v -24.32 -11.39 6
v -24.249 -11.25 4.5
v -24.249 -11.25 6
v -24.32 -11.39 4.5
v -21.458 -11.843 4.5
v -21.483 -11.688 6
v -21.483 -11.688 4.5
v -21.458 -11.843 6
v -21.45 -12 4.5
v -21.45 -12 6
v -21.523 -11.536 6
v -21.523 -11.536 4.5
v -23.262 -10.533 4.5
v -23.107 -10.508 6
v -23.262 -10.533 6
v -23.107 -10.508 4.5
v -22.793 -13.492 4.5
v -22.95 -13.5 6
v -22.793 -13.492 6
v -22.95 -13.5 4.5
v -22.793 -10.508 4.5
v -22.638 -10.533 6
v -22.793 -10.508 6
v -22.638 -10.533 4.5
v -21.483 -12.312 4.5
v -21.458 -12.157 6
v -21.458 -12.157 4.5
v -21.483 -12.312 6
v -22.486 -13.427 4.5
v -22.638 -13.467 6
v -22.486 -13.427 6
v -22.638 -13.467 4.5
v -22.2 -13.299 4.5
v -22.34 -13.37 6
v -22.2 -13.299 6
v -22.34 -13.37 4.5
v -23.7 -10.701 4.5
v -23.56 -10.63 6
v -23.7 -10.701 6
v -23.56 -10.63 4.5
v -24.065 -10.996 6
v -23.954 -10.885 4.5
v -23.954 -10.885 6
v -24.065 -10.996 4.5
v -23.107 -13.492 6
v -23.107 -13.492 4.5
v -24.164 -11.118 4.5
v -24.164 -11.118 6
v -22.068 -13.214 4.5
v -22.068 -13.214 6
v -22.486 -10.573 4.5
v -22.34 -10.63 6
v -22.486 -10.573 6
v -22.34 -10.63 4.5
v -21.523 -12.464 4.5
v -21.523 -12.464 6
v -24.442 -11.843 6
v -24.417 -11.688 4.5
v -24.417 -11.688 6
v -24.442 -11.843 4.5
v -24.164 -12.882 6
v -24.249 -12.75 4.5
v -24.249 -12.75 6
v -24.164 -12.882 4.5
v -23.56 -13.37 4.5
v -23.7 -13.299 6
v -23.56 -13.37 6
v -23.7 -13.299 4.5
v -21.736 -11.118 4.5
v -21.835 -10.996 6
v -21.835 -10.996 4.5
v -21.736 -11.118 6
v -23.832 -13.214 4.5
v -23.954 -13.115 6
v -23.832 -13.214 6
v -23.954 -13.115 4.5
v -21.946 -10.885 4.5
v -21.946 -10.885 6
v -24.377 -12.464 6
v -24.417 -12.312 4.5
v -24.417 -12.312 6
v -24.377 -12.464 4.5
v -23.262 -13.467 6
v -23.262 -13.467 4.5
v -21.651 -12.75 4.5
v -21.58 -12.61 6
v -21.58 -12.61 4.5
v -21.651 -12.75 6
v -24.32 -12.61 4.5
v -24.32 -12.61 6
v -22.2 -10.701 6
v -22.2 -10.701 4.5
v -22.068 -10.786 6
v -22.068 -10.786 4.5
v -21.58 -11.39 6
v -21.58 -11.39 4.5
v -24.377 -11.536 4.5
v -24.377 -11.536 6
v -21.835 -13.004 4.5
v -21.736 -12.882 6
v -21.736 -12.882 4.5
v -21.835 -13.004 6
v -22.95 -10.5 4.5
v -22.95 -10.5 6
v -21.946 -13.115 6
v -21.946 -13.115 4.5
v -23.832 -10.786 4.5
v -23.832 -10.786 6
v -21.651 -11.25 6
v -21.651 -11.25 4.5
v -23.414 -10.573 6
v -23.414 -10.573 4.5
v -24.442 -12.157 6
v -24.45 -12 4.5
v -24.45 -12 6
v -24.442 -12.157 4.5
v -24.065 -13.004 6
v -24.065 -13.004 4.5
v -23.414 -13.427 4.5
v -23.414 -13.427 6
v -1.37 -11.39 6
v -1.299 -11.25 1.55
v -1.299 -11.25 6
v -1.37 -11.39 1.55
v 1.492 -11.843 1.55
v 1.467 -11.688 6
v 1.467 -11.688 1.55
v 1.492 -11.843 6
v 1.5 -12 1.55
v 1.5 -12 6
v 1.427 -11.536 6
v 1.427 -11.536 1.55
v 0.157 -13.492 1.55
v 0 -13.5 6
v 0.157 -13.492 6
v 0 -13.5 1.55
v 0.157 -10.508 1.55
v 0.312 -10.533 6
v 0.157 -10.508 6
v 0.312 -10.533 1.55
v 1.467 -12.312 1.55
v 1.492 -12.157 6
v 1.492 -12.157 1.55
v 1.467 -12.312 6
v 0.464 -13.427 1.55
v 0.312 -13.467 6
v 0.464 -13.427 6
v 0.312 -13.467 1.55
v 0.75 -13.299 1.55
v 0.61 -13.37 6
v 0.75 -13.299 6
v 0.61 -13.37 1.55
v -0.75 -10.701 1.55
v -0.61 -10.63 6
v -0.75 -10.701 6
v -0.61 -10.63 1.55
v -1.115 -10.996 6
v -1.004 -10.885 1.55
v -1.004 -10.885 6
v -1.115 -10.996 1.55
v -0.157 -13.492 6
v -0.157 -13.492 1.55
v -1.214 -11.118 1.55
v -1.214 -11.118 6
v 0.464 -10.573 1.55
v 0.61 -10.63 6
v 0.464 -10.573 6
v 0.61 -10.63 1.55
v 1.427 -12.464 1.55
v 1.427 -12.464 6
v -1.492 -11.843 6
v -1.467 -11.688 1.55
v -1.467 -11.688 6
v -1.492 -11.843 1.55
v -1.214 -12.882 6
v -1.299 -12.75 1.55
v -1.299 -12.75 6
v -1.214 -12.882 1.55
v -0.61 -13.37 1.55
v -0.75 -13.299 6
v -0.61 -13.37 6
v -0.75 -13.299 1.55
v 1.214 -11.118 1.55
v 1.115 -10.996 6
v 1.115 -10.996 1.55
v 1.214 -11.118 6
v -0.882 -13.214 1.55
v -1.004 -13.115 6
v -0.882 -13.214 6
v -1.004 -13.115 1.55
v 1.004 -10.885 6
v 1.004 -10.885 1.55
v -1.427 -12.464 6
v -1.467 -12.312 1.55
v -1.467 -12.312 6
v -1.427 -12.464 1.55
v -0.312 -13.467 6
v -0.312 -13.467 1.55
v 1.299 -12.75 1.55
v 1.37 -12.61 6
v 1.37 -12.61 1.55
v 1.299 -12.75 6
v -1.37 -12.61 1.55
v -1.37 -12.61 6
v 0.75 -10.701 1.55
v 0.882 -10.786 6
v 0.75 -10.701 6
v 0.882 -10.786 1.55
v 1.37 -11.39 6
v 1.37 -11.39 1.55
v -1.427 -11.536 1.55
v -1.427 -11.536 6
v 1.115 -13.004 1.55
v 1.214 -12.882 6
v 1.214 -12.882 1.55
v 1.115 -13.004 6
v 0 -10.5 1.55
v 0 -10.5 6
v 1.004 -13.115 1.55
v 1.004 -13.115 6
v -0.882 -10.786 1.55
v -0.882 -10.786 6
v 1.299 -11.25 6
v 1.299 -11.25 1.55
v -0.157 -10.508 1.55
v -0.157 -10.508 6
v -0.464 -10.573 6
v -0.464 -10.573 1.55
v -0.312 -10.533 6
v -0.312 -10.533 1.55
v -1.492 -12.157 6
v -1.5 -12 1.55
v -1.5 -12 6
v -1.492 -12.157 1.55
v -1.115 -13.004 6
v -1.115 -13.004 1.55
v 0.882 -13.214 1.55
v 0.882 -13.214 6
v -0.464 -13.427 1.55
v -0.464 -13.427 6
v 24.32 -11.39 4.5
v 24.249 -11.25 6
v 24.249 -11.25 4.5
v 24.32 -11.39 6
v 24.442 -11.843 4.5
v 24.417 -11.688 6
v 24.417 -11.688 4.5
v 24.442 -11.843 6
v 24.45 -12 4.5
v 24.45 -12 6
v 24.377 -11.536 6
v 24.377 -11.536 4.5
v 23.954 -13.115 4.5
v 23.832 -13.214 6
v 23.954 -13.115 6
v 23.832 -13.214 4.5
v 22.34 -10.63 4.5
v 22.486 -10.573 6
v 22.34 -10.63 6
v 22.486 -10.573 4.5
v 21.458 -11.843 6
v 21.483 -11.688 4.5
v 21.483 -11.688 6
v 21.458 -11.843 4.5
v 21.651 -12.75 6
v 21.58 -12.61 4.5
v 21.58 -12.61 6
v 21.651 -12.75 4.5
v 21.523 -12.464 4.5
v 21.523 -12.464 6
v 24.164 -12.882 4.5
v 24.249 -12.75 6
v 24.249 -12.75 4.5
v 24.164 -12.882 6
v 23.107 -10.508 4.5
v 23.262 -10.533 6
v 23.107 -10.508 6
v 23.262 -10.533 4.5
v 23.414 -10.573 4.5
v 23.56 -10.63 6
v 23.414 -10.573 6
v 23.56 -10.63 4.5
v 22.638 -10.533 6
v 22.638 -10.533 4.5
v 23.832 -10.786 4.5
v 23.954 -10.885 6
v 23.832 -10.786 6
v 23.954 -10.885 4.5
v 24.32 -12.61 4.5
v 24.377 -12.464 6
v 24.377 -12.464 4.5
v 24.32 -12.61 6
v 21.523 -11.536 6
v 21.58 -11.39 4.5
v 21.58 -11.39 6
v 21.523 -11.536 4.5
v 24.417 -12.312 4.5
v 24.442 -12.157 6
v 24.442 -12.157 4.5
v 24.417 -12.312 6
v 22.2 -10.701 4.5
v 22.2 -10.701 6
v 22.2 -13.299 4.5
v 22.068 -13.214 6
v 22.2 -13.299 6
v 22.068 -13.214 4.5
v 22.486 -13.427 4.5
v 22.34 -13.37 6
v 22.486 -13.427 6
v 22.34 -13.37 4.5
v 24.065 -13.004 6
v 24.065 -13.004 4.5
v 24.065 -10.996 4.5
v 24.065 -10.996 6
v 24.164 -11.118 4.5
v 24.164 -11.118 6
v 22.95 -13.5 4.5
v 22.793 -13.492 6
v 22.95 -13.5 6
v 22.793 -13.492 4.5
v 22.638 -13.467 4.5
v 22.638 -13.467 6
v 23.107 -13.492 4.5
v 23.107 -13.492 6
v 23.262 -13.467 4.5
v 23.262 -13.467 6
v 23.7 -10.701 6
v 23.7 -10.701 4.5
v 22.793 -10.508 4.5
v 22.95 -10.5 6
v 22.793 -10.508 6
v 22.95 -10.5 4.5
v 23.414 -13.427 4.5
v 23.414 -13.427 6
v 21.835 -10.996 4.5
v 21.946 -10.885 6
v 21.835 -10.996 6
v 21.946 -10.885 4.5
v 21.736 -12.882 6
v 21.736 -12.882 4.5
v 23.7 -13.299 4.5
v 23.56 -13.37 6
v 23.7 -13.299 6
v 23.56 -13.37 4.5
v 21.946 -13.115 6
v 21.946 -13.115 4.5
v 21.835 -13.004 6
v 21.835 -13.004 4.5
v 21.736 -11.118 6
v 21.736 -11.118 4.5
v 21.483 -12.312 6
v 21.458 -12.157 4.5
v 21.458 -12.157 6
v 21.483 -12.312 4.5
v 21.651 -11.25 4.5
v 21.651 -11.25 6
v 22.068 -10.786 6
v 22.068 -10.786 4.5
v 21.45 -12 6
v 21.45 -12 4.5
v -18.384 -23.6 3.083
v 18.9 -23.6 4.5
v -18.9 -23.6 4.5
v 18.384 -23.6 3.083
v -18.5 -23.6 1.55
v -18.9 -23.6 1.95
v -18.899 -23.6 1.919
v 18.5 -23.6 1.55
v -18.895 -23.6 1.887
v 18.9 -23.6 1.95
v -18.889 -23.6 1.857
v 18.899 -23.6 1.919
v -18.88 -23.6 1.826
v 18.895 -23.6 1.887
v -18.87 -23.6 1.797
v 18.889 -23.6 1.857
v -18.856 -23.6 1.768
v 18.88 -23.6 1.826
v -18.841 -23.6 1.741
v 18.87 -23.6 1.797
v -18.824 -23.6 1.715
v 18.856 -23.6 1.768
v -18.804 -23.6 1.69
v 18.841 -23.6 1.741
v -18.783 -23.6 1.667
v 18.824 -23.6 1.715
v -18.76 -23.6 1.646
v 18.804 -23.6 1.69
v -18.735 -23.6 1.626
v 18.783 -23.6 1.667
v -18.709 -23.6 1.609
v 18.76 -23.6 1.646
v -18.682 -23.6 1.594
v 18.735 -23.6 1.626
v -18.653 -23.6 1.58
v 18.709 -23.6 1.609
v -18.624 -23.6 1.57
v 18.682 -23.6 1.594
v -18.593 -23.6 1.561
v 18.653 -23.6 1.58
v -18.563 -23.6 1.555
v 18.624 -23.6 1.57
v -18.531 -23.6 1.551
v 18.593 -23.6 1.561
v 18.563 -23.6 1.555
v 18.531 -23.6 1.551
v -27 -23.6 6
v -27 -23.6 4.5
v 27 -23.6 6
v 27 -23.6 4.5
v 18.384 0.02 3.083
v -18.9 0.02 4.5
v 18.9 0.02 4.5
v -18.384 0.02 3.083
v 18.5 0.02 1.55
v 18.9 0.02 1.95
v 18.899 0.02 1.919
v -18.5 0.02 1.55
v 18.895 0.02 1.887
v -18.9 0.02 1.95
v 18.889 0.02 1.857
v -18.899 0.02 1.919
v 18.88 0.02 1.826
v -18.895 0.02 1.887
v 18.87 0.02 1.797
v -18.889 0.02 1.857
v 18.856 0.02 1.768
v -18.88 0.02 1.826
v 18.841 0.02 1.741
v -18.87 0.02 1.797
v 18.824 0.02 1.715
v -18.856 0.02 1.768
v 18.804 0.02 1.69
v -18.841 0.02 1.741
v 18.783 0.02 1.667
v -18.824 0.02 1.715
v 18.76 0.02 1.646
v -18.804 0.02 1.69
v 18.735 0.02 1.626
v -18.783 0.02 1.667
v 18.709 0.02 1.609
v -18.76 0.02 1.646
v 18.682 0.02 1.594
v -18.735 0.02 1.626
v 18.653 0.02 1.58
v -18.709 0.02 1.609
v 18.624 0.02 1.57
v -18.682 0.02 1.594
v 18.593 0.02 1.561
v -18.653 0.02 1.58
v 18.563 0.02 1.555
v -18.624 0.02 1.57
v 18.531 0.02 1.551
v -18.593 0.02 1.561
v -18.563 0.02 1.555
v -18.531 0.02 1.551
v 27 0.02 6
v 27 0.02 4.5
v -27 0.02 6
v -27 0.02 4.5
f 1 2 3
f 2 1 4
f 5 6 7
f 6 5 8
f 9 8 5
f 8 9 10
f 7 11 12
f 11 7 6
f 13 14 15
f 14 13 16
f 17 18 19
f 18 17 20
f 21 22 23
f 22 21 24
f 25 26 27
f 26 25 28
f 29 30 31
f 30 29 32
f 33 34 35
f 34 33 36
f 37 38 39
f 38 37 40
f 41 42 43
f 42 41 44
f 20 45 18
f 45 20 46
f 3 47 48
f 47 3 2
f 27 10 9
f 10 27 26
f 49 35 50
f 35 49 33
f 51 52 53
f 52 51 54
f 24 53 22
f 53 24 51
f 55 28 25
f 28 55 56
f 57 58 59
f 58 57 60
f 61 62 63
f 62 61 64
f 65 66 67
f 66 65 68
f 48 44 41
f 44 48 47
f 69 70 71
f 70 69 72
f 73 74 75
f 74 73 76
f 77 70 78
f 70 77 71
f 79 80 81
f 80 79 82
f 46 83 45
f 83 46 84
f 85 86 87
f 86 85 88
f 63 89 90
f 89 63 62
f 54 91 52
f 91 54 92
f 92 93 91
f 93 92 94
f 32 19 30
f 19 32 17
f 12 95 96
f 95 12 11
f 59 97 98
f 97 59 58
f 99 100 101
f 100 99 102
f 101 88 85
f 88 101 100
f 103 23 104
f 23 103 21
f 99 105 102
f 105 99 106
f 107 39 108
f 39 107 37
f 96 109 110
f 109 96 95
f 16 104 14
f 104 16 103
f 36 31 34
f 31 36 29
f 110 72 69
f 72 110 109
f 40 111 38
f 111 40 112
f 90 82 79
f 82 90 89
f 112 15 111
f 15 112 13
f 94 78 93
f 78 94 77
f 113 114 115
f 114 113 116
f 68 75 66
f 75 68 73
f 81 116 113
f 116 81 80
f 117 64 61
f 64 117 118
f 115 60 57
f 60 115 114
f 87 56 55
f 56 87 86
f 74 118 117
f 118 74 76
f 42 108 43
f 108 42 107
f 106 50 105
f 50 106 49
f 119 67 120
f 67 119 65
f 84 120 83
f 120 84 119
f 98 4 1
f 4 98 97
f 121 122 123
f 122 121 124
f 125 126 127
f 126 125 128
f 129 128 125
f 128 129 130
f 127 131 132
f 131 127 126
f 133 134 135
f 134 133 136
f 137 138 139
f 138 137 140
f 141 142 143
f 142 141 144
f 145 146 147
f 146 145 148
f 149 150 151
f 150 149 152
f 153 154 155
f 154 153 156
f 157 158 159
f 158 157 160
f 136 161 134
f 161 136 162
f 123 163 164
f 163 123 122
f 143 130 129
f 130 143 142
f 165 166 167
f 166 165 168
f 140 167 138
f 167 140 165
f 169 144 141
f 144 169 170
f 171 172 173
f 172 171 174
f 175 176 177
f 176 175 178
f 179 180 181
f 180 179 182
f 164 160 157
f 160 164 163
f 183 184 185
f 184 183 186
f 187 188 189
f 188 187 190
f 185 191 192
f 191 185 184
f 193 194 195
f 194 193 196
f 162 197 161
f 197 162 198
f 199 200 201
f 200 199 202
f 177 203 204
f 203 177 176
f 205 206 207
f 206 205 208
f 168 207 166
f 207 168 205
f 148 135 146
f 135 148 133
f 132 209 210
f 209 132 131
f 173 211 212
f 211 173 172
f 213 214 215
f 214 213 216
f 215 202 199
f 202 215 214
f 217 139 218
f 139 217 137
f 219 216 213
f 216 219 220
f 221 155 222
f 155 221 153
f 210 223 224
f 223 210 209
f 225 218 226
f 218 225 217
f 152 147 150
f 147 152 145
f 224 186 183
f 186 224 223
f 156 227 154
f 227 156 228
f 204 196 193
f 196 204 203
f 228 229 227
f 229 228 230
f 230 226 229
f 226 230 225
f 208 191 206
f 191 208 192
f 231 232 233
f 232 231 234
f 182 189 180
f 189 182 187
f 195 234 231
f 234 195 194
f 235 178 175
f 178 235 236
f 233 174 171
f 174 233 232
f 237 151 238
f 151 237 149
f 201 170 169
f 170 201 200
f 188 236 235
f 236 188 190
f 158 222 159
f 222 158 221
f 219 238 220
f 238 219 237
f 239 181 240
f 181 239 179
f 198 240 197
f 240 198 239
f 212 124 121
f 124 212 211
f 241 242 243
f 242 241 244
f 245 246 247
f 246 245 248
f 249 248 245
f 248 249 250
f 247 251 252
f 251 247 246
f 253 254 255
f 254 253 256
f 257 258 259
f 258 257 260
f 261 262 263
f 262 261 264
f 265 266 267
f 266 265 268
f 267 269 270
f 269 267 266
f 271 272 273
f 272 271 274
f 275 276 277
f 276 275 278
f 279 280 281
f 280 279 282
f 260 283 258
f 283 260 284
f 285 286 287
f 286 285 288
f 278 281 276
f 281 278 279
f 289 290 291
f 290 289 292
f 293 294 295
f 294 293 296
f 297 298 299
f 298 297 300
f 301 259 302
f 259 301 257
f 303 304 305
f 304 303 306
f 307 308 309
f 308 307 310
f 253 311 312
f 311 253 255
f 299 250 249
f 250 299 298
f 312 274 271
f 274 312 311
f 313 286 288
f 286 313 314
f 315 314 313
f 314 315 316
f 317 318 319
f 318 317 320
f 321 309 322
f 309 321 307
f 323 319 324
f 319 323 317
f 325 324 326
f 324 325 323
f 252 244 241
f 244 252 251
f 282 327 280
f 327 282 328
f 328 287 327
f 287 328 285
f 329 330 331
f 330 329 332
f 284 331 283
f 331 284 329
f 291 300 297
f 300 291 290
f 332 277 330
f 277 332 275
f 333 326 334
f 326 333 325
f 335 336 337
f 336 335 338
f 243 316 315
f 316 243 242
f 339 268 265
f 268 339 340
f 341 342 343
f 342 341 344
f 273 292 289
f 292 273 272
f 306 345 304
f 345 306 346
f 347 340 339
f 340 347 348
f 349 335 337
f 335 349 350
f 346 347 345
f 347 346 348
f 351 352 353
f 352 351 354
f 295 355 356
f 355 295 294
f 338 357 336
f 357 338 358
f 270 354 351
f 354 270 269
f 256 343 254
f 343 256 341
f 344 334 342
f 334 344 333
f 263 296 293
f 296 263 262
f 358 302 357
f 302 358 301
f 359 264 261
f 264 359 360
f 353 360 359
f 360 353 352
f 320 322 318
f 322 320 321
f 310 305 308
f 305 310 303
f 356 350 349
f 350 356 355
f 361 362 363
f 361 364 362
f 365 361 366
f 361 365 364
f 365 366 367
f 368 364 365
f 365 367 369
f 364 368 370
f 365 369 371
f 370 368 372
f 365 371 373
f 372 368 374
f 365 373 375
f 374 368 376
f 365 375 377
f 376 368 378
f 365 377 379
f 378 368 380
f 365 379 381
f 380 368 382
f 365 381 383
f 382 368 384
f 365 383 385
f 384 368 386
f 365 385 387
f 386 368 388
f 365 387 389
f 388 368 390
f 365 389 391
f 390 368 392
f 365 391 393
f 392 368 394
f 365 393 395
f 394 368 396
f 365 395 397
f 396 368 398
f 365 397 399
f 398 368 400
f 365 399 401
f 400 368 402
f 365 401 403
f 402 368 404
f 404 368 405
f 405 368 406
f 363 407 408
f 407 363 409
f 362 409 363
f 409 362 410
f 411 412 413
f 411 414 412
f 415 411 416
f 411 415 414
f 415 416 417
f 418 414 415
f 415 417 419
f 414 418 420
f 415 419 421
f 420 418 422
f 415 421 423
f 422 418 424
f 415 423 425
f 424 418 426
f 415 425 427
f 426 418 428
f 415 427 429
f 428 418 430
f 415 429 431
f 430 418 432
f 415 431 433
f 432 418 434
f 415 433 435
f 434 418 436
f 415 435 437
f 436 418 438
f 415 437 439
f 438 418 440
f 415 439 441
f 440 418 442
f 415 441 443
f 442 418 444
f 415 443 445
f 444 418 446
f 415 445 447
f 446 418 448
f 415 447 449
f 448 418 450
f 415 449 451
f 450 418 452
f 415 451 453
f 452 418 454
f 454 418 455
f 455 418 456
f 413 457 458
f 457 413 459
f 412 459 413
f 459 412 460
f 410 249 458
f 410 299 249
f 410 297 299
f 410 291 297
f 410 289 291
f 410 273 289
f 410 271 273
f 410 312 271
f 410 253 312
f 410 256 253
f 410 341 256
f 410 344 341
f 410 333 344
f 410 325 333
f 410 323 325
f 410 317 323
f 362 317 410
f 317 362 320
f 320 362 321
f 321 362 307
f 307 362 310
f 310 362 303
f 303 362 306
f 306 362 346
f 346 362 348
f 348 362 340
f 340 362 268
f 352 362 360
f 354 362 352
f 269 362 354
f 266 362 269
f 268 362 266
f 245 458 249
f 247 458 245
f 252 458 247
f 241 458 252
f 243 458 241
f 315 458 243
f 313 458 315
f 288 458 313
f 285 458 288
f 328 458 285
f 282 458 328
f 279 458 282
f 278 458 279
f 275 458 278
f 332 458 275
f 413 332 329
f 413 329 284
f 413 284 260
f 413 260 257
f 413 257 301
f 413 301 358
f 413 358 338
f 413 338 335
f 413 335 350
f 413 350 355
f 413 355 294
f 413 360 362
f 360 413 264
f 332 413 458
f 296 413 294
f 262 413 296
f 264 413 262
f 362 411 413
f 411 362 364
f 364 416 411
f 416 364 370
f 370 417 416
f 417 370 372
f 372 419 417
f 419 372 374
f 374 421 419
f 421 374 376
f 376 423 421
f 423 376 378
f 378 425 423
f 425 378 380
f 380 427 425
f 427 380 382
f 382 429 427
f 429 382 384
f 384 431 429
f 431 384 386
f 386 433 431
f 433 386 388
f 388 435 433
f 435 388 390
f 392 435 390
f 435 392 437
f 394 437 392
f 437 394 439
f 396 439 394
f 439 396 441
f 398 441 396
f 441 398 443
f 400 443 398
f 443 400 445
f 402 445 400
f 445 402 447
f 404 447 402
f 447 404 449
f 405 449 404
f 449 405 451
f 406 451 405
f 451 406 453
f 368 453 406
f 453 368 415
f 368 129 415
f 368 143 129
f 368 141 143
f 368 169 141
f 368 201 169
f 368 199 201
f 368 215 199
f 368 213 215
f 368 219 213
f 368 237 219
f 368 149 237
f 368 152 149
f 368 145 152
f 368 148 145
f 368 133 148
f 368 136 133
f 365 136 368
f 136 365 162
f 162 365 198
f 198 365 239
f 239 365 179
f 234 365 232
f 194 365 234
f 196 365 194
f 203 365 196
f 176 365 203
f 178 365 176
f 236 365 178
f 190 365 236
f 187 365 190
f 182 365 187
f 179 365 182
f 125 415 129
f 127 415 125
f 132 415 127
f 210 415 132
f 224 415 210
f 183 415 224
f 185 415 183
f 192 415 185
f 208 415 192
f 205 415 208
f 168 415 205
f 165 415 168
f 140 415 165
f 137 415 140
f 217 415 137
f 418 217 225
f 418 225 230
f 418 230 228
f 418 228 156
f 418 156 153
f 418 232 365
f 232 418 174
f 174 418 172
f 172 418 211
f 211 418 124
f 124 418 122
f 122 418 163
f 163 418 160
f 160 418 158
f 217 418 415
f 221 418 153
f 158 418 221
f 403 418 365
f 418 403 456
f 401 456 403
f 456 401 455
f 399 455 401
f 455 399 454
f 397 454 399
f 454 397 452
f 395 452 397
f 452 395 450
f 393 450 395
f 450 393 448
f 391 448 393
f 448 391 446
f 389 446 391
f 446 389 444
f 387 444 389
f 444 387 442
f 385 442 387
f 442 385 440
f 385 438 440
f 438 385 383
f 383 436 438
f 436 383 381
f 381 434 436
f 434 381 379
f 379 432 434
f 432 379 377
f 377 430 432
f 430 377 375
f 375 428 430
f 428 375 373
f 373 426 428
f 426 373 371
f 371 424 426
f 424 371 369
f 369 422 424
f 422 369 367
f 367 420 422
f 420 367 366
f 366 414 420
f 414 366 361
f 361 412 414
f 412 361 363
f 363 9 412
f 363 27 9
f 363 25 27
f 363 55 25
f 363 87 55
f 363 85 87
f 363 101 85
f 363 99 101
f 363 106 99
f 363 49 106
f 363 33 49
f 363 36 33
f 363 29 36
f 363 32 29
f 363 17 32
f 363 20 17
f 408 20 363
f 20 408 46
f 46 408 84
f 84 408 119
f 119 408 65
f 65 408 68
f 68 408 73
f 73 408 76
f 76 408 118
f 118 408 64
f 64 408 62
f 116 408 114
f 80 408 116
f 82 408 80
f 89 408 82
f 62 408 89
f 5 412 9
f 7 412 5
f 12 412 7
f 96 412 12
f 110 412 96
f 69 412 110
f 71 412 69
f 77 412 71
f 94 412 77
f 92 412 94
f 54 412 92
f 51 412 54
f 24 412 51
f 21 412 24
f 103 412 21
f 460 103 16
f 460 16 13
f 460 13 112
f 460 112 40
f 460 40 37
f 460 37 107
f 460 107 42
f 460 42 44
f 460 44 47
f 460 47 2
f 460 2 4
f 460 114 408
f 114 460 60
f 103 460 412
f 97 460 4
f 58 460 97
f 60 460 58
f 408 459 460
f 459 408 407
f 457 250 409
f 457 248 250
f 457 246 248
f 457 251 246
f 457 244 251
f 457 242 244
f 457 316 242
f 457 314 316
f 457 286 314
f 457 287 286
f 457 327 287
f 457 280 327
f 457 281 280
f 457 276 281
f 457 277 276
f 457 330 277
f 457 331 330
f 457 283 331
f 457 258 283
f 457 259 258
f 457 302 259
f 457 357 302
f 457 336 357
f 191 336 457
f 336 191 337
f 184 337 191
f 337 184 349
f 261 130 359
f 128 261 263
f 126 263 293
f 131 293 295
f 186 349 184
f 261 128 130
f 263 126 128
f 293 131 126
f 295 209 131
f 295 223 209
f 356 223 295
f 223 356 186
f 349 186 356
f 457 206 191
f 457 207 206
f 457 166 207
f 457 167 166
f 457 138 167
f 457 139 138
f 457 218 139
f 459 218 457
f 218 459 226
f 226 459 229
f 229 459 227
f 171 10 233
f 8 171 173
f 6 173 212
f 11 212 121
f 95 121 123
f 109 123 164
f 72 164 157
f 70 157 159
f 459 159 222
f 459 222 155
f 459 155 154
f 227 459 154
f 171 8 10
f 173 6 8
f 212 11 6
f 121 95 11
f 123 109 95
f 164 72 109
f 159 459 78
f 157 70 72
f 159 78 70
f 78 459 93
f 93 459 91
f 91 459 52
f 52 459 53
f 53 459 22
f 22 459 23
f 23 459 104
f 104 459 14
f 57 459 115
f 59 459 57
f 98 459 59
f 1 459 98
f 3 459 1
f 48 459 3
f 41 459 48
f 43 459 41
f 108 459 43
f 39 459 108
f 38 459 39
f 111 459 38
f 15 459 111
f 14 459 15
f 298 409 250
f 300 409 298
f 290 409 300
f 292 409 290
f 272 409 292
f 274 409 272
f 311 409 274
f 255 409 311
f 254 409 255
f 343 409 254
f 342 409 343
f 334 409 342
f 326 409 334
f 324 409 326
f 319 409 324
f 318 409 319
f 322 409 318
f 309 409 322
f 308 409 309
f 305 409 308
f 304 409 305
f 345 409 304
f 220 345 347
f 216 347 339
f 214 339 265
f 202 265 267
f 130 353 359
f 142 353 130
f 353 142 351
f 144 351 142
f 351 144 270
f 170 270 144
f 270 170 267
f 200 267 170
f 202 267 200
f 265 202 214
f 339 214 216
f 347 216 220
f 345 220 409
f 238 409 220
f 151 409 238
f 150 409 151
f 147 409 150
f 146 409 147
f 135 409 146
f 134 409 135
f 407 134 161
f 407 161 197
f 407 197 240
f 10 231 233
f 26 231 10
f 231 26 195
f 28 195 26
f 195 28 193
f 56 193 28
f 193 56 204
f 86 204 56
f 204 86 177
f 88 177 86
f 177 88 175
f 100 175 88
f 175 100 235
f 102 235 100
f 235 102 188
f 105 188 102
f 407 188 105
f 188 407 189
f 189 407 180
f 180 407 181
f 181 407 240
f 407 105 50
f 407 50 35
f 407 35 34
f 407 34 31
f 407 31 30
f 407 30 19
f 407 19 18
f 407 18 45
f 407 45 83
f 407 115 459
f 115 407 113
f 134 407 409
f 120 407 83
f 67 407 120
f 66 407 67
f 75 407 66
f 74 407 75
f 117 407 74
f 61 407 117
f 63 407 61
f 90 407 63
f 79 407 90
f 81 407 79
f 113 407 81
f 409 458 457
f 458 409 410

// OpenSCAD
use <../../scad/components/plate_joint/plate_joint.scad>
use <../../scad/lib/plist.scad>

part         = "male";
rib          = true;
pins         = false;
pad          = false;
relief       = 0;
side         = 1;
joint_anchor = [0, -1, 1];
bolts        = 3;
show_bolts   = false;
show_sizes   = false;
flip         = false;
pin_d        = undef;
mirror_part  = "male";

module joint(mode, slot=false, flipped=flip) {
  plate_joint(plate_h=6,
              bolt_d=3,
              w=54,
              l=24,
              mode=mode == "female_slots" ? "female" : mode,
              dovetail_rib=rib,
              include_pin_holes=pins,
              pin_use_pad=pad,
              pin_d=pin_d,
              relief_depth=relief,
              root_side=side,
              anchor=joint_anchor,
              bolt_n_center=bolts,
              slot_mode=slot,
              show_bolts=show_bolts,
              flip=flipped,
              show_sizes=show_sizes);
}

if (part == "male" || part == "female") {
  joint(part);
} else if (part == "collision") {
  intersection() {
    joint("male");
    joint("female");
  }
} else if (part == "socket_difference") {
  // Compare the female body to cutting the same socket out of a parent plate.
  difference() {
    difference() {
      translate([-27, -24 - (side == -1 ? 0.02 : 0), 0]) {
        cube([54, 24.02, 6]);
      }
      joint("female", slot=true);
    }
    joint("female");
  }
} else if (part == "base") {
  plate_joint_base(w=54,
                   l=24,
                   plate_h=6,
                   base_h=1.5,
                   rail_w=37.8,
                   rail_h=3,
                   angle=20,
                   rail_corner_r=0.5,
                   dovetail_rib=rib,
                   anchor=joint_anchor,
                   flip=flip);
}

module check_flip_difference() {
  // Reference reflection about the midpoint of the already-anchored envelope.
  module expected() {
    translate([0, 0, 6 * joint_anchor[2]]) {
      mirror([0, 0, 1]) {
        joint(mirror_part, slot=mirror_part == "female_slots", flipped=false);
      }
    }
  }
  module actual() {
    joint(mirror_part, slot=mirror_part == "female_slots", flipped=true);
  }
  difference() {
    actual();
    expected();
  }
  difference() {
    expected();
    actual();
  }
}

module check_pin_cover() {
  // A 3.1 mm pin bridges a 24 mm joint with 12 mm embedded in each parent.
  // Verify a thin sleeve of material around each passage, including below it.
  p = plate_joint_parameters(plate_h=6,
                             bolt_d=3.2,
                             w=54,
                             l=24,
                             pin_d=3.1,
                             include_pin_holes=true);
  module holes() {
    plate_joint_pin_holes(d=plist_get("pin_d", p),
                          pin_l=plist_get("pin_l", p),
                          l=24,
                          spacing=plist_get("pin_spacing", p),
                          z=plist_get("pin_z", p),
                          compensation=plist_get("pin_compensation", p));
  }
  module parents_and_joint() {
    difference() {
      union() {
        plate_joint_male(p);
        plate_joint_female(p);
        translate([-27, 0, 0]) {
          cube([54, 12, 6]);
        }
        translate([-27, -36, 0]) {
          cube([54, 12, 6]);
        }
      }
      // Cut at assembly scope so both parent plates receive the full passages.
      holes();
    }
  }
  difference() {
    difference() {
      plate_joint_pin_holes(d=3.6,
                            pin_l=44,
                            l=24,
                            spacing=plist_get("pin_spacing", p),
                            z=plist_get("pin_z", p),
                            compensation=0.4);
      plate_joint_pin_holes(d=3.5,
                            pin_l=48,
                            l=24,
                            spacing=plist_get("pin_spacing", p),
                            z=plist_get("pin_z", p),
                            compensation=0.4);
      // The male free tip intentionally stops short of its mating plate.
      // Exclude only that axial fit gap from the material-cover probe.
      translate([-27, -24.001, 0]) {
        cube([54, plist_get("axial_clearance", p) + 0.002, 6]);
      }
    }
    parents_and_joint();
  }
}

if (part == "flip_difference") {
  check_flip_difference();
}
if (part == "pin_cover_missing") {
  check_pin_cover();
}
